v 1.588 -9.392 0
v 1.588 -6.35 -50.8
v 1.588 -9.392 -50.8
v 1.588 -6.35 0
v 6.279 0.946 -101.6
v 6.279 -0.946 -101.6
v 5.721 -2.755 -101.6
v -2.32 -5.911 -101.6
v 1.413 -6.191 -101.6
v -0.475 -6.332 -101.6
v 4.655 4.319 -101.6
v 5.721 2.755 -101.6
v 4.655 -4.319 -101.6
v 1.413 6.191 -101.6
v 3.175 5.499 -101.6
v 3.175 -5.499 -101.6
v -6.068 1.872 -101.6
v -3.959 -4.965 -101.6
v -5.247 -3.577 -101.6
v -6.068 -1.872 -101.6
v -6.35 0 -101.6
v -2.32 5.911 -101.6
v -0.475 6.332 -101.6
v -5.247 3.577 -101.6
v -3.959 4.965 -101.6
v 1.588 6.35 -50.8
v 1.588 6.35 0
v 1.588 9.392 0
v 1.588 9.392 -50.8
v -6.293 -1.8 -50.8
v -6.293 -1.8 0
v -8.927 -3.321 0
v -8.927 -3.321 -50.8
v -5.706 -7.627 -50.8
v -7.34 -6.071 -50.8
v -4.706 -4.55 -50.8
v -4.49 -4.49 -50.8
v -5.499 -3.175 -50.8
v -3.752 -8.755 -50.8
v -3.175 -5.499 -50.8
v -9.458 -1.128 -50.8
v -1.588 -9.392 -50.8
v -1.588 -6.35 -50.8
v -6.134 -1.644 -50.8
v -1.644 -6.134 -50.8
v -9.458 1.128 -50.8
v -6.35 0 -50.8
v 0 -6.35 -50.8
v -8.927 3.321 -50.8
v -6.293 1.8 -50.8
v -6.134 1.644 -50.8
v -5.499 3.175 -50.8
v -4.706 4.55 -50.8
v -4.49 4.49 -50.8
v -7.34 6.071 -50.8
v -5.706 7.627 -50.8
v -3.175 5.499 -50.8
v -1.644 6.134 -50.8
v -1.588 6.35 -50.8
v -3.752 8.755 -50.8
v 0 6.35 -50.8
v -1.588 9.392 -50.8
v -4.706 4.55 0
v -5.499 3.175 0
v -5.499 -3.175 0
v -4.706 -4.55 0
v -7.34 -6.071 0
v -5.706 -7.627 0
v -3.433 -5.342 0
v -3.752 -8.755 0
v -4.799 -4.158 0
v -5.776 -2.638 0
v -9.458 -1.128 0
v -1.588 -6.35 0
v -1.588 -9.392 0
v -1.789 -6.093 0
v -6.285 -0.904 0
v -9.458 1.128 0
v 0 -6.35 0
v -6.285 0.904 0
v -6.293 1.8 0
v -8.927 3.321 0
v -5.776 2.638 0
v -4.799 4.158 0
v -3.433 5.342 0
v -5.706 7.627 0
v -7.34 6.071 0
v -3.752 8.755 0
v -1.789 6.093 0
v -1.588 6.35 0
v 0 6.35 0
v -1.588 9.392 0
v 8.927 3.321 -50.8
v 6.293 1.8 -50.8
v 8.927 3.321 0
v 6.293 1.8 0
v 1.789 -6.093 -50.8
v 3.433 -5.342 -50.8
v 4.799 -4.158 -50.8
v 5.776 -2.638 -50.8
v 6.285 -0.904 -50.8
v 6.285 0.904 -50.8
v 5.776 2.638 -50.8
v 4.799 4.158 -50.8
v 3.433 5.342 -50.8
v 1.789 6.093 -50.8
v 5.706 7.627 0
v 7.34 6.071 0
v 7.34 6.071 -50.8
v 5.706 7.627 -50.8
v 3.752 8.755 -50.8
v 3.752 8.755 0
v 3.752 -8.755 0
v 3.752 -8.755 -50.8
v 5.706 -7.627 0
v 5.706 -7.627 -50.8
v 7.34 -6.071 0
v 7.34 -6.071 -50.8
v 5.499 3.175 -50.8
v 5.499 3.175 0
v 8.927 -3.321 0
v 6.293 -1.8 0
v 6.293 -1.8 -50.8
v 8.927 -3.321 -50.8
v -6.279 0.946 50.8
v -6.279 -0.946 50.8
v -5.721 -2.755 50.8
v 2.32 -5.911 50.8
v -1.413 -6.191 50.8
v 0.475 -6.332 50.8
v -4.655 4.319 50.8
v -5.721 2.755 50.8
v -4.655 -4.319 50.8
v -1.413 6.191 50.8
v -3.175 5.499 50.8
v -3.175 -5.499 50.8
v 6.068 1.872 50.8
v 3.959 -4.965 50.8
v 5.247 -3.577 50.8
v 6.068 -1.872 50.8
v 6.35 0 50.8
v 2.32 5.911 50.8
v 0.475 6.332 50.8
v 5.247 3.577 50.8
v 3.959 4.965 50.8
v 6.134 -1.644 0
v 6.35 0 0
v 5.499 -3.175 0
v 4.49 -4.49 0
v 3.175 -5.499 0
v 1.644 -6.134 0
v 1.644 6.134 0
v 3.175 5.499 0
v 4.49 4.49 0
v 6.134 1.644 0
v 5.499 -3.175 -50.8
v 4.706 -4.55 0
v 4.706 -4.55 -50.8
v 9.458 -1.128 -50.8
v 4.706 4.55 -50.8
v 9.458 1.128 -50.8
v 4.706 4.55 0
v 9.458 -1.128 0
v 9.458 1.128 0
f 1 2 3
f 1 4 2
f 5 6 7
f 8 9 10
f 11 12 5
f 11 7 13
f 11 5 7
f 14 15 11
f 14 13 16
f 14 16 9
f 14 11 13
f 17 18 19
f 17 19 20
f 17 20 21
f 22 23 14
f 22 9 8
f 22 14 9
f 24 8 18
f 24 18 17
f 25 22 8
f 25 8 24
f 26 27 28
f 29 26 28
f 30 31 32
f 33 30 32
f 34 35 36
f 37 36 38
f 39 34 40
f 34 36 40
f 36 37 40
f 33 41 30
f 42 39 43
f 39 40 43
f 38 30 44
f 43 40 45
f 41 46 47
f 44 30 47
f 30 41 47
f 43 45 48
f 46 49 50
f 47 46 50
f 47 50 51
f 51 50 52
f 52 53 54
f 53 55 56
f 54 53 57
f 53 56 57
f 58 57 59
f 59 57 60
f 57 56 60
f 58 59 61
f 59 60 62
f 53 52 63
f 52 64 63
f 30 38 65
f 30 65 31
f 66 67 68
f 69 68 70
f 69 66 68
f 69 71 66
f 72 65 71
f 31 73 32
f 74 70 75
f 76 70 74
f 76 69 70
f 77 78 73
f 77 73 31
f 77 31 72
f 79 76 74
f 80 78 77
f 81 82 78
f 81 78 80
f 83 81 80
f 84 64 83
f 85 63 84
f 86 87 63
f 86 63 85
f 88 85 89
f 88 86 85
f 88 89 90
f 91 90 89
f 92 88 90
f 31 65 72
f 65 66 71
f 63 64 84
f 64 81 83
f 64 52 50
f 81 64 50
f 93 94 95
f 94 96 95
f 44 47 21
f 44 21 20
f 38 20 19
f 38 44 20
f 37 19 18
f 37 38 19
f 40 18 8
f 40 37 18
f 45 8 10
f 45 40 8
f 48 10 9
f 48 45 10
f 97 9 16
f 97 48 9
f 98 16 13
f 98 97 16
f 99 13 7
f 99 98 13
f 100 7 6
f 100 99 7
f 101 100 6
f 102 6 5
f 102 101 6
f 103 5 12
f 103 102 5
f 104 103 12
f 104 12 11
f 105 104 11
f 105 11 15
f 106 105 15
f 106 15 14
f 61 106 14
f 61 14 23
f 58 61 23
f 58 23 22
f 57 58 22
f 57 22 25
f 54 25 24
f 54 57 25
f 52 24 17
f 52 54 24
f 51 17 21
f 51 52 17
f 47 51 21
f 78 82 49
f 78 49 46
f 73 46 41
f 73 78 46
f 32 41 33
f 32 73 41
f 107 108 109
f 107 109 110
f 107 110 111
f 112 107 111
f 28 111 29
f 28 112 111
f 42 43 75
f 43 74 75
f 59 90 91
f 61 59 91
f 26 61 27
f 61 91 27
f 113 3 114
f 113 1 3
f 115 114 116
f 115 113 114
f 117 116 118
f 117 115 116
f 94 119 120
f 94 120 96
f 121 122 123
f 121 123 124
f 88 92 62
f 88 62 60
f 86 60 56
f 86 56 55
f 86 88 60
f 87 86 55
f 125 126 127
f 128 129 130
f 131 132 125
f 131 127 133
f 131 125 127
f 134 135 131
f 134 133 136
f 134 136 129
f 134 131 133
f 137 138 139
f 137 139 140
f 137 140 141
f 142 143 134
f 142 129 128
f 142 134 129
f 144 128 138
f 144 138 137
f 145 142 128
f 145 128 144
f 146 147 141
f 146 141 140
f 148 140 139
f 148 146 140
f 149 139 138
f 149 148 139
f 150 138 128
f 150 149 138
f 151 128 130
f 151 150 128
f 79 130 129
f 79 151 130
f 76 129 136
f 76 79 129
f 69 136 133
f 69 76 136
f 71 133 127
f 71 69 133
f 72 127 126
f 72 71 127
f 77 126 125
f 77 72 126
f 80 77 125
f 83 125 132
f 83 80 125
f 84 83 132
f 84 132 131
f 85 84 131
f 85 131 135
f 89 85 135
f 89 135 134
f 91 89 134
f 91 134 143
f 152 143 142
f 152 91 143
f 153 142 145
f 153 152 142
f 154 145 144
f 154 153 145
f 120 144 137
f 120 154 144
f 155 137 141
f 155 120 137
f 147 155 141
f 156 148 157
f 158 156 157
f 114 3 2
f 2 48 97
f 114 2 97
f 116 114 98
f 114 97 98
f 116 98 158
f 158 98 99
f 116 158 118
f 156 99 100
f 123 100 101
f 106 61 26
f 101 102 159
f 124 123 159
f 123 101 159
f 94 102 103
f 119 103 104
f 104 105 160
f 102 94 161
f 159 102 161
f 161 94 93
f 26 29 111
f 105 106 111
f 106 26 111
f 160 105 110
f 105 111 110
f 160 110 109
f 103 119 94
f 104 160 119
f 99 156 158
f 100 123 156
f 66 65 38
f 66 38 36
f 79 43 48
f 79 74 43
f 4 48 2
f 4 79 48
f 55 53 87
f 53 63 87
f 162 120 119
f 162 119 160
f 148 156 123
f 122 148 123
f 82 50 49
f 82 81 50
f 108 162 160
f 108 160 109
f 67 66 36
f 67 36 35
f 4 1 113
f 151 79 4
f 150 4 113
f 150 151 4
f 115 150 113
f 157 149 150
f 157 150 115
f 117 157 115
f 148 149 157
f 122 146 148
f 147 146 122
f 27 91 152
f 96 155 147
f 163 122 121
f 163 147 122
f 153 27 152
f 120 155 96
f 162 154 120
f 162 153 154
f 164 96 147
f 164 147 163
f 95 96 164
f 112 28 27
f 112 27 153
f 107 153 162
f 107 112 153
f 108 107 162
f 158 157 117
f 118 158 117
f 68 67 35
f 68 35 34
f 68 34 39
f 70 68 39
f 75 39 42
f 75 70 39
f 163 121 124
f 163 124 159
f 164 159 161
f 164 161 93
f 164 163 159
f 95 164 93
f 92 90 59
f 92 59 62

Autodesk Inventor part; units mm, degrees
ref_plane "YZ Plane" through (0, 0, 0) normal (1, 0, 0) x (0, 1, 0)
ref_plane "XZ Plane" through (0, 0, 0) normal (0, 1, 0) x (-1, 0, 0)
ref_plane "XY Plane" through (0, 0, 0) normal (0, 0, 1) x (1, 0, 0)
sketch "Sketch1" plane through (0, 0, 0) normal (0, 0, 1) x (1, 0, 0)
  line L0 (0, 0) -> (0, 9.525) construction
  line L1 (0, 6.35) -> (1.5875, 6.35)
  line L2 (1.5875, 6.35) -> (1.5875, 9.3918)
  line L3 (0, 6.35) -> (-1.5875, 6.35)
  line L4 (-1.5875, 6.35) -> (-1.5875, 9.3918)
  line L5 (-6.293, 1.8002) -> (-8.9273, 3.3211)
  line L6 (-5.4993, 3.175) -> (-6.293, 1.8002)
  line L7 (-5.4993, 3.175) -> (-4.7055, 4.5498)
  line L8 (-4.7055, 4.5498) -> (-7.3398, 6.0707)
  line L9 (-4.7055, -4.5498) -> (-7.3398, -6.0707)
  line L10 (-5.4993, -3.175) -> (-4.7055, -4.5498)
  line L11 (-5.4993, -3.175) -> (-6.293, -1.8002)
  line L12 (-6.293, -1.8002) -> (-8.9273, -3.3211)
  line L13 (1.5875, -6.35) -> (1.5875, -9.3918)
  line L14 (0, -6.35) -> (1.5875, -6.35)
  line L15 (0, -6.35) -> (-1.5875, -6.35)
  line L16 (-1.5875, -6.35) -> (-1.5875, -9.3918)
  line L17 (6.293, -1.8002) -> (8.9273, -3.3211)
  line L18 (5.4993, -3.175) -> (6.293, -1.8002)
  line L19 (5.4993, -3.175) -> (4.7055, -4.5498)
  line L20 (4.7055, -4.5498) -> (7.3398, -6.0707)
  line L21 (4.7055, 4.5498) -> (7.3398, 6.0707)
  line L22 (5.4993, 3.175) -> (4.7055, 4.5498)
  line L23 (5.4993, 3.175) -> (6.293, 1.8002)
  line L24 (6.293, 1.8002) -> (8.9273, 3.3211)
  arc A0 (-1.5875, 9.3918) -> (-7.3398, 6.0707) centre (0, 0) ccw
  arc A1 (-8.9273, 3.3211) -> (-8.9273, -3.3211) centre (0, 0) ccw
  arc A2 (-7.3398, -6.0707) -> (-1.5875, -9.3918) centre (0, 0) ccw
  arc A3 (1.5875, -9.3918) -> (7.3398, -6.0707) centre (0, 0) ccw
  arc A4 (8.9273, -3.3211) -> (8.9273, 3.3211) centre (0, 0) ccw
  arc A5 (7.3398, 6.0707) -> (1.5875, 9.3918) centre (0, 0) ccw
  dimension "splineDepth" = 3.175
  dimension "splineWidth" = 3.175
  dimension "d6" = 360
extrude "Extrusion1" add sketch "Sketch1" against normal blind 50.8
sketch "Sketch2" plane through (0, 0, -50.8) normal (0, 0, -1) x (-1, 0, 0)
  circle A0 centre (0, 0) radius 6.35
  dimension "innerDiameter" = 12.7
extrude "Extrusion2" add sketch "Sketch2" along normal blind 50.8
sketch "Sketch3" plane through (0, 0, 0) normal (0, 0, 1) x (1, 0, 0)
  circle A0 centre (0, 0) radius 6.35
  dimension "d13" = 12.7
extrude "Extrusion3" add sketch "Sketch3" along normal blind 50.8
equation "\"d13\" = innerDiameter"
properties part number "innerShaft" material "PET Plastic"
